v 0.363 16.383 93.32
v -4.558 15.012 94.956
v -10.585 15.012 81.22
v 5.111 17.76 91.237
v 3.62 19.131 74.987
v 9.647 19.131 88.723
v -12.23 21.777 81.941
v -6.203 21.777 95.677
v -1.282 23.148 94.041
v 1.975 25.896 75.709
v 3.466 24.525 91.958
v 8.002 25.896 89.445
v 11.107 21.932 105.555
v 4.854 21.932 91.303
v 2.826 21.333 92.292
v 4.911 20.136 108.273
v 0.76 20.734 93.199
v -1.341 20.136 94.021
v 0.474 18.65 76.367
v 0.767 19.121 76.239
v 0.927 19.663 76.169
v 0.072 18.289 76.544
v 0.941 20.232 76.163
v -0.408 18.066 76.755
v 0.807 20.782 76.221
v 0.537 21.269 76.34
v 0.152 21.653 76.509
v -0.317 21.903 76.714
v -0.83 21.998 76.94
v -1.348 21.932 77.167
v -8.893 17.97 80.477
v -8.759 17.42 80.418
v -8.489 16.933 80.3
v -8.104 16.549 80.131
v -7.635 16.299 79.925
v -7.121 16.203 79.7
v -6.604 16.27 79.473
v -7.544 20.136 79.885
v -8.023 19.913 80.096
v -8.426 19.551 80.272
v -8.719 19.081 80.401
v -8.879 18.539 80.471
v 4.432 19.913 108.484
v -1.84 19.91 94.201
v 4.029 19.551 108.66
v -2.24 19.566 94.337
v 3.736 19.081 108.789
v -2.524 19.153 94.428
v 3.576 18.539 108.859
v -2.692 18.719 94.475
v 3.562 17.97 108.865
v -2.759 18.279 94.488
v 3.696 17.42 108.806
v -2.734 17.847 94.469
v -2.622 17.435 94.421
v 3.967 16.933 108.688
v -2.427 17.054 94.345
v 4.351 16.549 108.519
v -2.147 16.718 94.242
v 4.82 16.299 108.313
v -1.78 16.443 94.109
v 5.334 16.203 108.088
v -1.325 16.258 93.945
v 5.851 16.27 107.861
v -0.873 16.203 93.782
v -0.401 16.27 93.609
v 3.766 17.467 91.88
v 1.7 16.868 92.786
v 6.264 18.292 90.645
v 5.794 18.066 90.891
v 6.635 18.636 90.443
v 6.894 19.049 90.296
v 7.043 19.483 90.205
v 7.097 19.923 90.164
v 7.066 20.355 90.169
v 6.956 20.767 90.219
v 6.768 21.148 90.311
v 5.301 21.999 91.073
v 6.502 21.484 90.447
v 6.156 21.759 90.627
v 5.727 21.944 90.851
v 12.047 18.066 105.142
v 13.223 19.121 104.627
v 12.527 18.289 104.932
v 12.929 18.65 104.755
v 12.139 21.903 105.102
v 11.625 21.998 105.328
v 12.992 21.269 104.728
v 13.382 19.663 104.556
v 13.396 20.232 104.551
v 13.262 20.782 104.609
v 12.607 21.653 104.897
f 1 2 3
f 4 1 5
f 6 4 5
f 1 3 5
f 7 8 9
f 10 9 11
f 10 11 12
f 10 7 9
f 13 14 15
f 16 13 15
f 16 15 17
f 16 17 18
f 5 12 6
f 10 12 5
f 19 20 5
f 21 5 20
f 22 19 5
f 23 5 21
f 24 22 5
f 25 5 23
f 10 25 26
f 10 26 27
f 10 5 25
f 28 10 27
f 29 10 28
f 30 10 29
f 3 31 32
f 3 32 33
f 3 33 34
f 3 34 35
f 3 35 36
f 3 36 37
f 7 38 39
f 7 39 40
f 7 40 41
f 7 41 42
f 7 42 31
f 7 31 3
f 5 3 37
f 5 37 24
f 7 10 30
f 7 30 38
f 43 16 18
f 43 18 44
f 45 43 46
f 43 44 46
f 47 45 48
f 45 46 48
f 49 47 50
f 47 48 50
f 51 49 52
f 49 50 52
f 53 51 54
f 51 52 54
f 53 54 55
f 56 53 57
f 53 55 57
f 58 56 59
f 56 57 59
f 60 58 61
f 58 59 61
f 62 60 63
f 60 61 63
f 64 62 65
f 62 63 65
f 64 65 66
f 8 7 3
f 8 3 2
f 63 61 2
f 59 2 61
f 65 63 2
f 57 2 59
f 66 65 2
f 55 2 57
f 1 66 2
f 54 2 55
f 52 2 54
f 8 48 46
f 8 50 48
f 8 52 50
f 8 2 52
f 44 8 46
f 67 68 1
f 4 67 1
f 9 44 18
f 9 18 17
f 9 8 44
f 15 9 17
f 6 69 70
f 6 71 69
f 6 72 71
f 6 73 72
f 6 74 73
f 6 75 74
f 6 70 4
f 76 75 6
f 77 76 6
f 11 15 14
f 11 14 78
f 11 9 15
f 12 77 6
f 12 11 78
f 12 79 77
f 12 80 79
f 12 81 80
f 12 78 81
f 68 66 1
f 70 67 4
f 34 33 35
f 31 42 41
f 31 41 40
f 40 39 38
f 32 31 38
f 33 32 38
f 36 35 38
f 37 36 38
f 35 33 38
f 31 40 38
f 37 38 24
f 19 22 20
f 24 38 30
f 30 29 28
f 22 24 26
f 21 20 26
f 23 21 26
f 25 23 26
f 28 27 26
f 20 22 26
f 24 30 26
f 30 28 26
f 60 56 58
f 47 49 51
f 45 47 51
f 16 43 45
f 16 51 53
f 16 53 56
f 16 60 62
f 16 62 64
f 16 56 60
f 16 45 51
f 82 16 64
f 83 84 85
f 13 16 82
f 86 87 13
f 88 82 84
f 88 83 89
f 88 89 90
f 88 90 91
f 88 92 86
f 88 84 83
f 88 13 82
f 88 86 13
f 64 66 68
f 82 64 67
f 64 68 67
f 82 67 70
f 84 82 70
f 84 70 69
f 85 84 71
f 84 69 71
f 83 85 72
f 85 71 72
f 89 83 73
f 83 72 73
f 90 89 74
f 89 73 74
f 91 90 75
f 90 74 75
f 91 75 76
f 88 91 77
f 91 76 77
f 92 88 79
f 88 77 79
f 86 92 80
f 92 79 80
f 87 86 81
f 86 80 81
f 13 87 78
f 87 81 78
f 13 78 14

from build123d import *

# Parameters (mm, degrees)
BOSS_EXTRUDE1_DEPTH = 7
BOSS_EXTRUDE2_DEPTH = 31


with BuildPart() as part:
    # Sketch2 → Boss-Extrude1 (new body)
    with BuildSketch(Plane(origin=(-7.607664395, 31.287005672, 3.337829853), x_dir=(0.971914021301819, 0.23501337979879552, 0.0123226016926005), z_dir=(-0.23501337979879552, 0.9665075330997785, 0.10311110404281207))):
        with BuildLine():
            Line((8.938687007, -72.653651109), (-5.758907082, -79.102156982))
            Line((-5.758907082, -79.102156982), (0.267733921, -92.838226224))
            ThreePointArc((0.267733921, -92.838226224), (7.833125922, -90.10764187), (14.96532801, -86.389720351))
            Line((14.96532801, -86.389720351), (8.938687007, -72.653651109))
        make_face()
    extrude(amount=-BOSS_EXTRUDE1_DEPTH)

    # Sketch4 → Boss-Extrude2 (add)
    with BuildSketch(Plane(origin=(28.173765631, 2.9e-08, 64.214343511), x_dir=(-0.9157379494904142, 6.021465183735281e-11, 0.4017760668122129), z_dir=(-0.40177606681221284, -4.1173746889623063e-10, -0.9157379494904141))):
        with BuildLine():
            Line((32.238376721, 21.932158606), (39.003929453, 20.135690895))
            ThreePointArc((39.003929453, 20.135690895), (40.42366803, 17.68939934), (37.977376475, 16.269660762))
            Line((37.977376475, 16.269660762), (31.211823744, 18.066128473))
            ThreePointArc((31.211823744, 18.066128473), (29.792085166, 20.512420028), (32.238376721, 21.932158606))
        make_face()
    extrude(amount=-BOSS_EXTRUDE2_DEPTH)


solid = part.part
